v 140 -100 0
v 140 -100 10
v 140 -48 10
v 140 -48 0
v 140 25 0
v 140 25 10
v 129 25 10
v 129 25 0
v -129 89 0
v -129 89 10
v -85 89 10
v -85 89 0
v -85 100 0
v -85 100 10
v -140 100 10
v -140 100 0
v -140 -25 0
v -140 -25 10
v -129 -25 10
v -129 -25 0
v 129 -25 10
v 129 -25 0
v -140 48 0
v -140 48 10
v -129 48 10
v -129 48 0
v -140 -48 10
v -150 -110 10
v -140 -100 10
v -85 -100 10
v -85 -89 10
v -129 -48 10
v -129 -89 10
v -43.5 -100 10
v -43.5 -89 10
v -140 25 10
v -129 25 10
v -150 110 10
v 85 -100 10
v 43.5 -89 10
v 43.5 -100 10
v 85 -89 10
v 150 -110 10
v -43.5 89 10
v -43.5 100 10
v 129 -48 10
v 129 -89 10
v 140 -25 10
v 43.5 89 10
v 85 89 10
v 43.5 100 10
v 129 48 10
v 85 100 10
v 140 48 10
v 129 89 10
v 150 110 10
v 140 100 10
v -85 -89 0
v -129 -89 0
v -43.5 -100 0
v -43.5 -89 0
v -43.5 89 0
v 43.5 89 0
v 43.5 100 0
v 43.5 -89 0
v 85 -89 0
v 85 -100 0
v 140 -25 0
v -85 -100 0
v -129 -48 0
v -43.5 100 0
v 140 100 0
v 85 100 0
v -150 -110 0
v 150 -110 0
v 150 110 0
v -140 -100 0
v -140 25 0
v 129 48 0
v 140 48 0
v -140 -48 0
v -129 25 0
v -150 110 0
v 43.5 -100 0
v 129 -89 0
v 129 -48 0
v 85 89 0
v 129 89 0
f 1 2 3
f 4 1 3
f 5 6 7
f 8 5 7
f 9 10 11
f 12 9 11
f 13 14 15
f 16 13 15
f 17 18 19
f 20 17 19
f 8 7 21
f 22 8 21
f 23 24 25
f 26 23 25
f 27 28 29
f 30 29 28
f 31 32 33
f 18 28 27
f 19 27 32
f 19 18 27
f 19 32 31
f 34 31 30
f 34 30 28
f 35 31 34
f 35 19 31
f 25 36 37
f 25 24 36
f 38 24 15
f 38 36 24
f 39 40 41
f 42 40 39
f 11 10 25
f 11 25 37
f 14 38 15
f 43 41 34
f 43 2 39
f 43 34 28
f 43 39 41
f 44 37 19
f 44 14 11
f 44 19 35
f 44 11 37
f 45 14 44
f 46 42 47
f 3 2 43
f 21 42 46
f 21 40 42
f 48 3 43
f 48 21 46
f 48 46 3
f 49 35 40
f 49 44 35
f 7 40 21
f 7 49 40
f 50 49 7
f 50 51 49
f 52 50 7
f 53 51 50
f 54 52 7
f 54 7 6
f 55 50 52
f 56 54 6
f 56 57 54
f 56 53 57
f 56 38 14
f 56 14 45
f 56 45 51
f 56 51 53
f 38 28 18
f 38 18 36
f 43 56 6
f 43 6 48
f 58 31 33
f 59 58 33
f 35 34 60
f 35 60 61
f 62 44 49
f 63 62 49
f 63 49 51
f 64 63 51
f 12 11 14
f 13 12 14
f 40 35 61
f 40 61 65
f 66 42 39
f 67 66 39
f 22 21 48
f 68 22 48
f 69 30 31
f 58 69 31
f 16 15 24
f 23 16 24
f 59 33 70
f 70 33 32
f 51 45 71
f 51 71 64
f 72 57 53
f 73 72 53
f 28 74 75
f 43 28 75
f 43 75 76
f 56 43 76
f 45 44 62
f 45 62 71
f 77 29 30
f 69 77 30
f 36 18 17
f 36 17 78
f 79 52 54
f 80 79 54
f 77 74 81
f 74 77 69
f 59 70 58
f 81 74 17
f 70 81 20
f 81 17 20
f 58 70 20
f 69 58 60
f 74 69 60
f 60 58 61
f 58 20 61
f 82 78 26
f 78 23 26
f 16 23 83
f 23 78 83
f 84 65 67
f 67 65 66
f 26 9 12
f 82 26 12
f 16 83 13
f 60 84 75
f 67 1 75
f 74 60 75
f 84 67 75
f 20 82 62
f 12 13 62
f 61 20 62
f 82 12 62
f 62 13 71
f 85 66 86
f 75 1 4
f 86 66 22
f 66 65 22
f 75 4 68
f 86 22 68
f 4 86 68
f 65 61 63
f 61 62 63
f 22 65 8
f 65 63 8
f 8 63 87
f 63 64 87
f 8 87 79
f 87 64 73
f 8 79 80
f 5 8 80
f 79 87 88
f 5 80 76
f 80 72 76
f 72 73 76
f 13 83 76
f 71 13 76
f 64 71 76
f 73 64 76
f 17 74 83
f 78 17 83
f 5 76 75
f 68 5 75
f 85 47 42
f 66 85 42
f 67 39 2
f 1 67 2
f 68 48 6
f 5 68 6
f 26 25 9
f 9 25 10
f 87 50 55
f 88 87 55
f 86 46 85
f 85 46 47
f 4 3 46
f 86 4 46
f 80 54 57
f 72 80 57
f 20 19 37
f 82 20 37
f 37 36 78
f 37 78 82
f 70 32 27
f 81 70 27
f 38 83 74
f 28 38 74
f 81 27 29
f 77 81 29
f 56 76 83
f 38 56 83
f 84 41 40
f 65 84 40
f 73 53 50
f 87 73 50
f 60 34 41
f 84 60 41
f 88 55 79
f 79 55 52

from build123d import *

# Parameters (mm, degrees)
F1_DEPTH = 10
F3_DEPTH = 10
F4_W     = 87
F4_H     = 11
F5_DEPTH = 10
F6_W     = 11
F6_H     = 50
F7_DEPTH = 10


with BuildPart() as f1:
    # F0 (on Top) → F1 (new body)
    with BuildSketch(Plane.XY):
        Polygon((150, 110), (-150, 110), (-150, -110), (-69, -110), (150, -110), align=None)
    extrude(amount=F1_DEPTH)

    # F2 (on face) → F3 (cut)
    with BuildSketch(Plane.XY.offset(10)):
        Polygon((140, 48), (140, 100), (85, 100), (85, 89), (129, 89), (129, 48), align=None)
        Polygon((-85, 100), (-140, 100), (-140, 48), (-129, 48), (-129, 89), (-85, 89), align=None)
        Polygon((-140, -48), (-140, -100), (-85, -100), (-85, -89), (-129, -89), (-129, -48), align=None)
        Polygon((85, -100), (140, -100), (140, -48), (129, -48), (129, -89), (85, -89), align=None)
    extrude(amount=-F3_DEPTH, mode=Mode.SUBTRACT)

    # F4 (on face) → F5 (cut)
    with BuildSketch(Plane.XY.offset(10)):
        with Locations((0, 94.5)):
            Rectangle(F4_W, F4_H)
        with Locations((0, -94.5)):
            Rectangle(F4_W, F4_H)
    extrude(amount=-F5_DEPTH, mode=Mode.SUBTRACT)

    # F6 (on face) → F7 (cut)
    with BuildSketch(Plane.XY.offset(10)):
        with Locations((-134.5, 0)):
            Rectangle(F6_W, F6_H)
        Polygon((140, -25), (140, 0), (140, 25), (129, 25), (129, -25), align=None)
    extrude(amount=-F7_DEPTH, mode=Mode.SUBTRACT)


solid = f1.part
